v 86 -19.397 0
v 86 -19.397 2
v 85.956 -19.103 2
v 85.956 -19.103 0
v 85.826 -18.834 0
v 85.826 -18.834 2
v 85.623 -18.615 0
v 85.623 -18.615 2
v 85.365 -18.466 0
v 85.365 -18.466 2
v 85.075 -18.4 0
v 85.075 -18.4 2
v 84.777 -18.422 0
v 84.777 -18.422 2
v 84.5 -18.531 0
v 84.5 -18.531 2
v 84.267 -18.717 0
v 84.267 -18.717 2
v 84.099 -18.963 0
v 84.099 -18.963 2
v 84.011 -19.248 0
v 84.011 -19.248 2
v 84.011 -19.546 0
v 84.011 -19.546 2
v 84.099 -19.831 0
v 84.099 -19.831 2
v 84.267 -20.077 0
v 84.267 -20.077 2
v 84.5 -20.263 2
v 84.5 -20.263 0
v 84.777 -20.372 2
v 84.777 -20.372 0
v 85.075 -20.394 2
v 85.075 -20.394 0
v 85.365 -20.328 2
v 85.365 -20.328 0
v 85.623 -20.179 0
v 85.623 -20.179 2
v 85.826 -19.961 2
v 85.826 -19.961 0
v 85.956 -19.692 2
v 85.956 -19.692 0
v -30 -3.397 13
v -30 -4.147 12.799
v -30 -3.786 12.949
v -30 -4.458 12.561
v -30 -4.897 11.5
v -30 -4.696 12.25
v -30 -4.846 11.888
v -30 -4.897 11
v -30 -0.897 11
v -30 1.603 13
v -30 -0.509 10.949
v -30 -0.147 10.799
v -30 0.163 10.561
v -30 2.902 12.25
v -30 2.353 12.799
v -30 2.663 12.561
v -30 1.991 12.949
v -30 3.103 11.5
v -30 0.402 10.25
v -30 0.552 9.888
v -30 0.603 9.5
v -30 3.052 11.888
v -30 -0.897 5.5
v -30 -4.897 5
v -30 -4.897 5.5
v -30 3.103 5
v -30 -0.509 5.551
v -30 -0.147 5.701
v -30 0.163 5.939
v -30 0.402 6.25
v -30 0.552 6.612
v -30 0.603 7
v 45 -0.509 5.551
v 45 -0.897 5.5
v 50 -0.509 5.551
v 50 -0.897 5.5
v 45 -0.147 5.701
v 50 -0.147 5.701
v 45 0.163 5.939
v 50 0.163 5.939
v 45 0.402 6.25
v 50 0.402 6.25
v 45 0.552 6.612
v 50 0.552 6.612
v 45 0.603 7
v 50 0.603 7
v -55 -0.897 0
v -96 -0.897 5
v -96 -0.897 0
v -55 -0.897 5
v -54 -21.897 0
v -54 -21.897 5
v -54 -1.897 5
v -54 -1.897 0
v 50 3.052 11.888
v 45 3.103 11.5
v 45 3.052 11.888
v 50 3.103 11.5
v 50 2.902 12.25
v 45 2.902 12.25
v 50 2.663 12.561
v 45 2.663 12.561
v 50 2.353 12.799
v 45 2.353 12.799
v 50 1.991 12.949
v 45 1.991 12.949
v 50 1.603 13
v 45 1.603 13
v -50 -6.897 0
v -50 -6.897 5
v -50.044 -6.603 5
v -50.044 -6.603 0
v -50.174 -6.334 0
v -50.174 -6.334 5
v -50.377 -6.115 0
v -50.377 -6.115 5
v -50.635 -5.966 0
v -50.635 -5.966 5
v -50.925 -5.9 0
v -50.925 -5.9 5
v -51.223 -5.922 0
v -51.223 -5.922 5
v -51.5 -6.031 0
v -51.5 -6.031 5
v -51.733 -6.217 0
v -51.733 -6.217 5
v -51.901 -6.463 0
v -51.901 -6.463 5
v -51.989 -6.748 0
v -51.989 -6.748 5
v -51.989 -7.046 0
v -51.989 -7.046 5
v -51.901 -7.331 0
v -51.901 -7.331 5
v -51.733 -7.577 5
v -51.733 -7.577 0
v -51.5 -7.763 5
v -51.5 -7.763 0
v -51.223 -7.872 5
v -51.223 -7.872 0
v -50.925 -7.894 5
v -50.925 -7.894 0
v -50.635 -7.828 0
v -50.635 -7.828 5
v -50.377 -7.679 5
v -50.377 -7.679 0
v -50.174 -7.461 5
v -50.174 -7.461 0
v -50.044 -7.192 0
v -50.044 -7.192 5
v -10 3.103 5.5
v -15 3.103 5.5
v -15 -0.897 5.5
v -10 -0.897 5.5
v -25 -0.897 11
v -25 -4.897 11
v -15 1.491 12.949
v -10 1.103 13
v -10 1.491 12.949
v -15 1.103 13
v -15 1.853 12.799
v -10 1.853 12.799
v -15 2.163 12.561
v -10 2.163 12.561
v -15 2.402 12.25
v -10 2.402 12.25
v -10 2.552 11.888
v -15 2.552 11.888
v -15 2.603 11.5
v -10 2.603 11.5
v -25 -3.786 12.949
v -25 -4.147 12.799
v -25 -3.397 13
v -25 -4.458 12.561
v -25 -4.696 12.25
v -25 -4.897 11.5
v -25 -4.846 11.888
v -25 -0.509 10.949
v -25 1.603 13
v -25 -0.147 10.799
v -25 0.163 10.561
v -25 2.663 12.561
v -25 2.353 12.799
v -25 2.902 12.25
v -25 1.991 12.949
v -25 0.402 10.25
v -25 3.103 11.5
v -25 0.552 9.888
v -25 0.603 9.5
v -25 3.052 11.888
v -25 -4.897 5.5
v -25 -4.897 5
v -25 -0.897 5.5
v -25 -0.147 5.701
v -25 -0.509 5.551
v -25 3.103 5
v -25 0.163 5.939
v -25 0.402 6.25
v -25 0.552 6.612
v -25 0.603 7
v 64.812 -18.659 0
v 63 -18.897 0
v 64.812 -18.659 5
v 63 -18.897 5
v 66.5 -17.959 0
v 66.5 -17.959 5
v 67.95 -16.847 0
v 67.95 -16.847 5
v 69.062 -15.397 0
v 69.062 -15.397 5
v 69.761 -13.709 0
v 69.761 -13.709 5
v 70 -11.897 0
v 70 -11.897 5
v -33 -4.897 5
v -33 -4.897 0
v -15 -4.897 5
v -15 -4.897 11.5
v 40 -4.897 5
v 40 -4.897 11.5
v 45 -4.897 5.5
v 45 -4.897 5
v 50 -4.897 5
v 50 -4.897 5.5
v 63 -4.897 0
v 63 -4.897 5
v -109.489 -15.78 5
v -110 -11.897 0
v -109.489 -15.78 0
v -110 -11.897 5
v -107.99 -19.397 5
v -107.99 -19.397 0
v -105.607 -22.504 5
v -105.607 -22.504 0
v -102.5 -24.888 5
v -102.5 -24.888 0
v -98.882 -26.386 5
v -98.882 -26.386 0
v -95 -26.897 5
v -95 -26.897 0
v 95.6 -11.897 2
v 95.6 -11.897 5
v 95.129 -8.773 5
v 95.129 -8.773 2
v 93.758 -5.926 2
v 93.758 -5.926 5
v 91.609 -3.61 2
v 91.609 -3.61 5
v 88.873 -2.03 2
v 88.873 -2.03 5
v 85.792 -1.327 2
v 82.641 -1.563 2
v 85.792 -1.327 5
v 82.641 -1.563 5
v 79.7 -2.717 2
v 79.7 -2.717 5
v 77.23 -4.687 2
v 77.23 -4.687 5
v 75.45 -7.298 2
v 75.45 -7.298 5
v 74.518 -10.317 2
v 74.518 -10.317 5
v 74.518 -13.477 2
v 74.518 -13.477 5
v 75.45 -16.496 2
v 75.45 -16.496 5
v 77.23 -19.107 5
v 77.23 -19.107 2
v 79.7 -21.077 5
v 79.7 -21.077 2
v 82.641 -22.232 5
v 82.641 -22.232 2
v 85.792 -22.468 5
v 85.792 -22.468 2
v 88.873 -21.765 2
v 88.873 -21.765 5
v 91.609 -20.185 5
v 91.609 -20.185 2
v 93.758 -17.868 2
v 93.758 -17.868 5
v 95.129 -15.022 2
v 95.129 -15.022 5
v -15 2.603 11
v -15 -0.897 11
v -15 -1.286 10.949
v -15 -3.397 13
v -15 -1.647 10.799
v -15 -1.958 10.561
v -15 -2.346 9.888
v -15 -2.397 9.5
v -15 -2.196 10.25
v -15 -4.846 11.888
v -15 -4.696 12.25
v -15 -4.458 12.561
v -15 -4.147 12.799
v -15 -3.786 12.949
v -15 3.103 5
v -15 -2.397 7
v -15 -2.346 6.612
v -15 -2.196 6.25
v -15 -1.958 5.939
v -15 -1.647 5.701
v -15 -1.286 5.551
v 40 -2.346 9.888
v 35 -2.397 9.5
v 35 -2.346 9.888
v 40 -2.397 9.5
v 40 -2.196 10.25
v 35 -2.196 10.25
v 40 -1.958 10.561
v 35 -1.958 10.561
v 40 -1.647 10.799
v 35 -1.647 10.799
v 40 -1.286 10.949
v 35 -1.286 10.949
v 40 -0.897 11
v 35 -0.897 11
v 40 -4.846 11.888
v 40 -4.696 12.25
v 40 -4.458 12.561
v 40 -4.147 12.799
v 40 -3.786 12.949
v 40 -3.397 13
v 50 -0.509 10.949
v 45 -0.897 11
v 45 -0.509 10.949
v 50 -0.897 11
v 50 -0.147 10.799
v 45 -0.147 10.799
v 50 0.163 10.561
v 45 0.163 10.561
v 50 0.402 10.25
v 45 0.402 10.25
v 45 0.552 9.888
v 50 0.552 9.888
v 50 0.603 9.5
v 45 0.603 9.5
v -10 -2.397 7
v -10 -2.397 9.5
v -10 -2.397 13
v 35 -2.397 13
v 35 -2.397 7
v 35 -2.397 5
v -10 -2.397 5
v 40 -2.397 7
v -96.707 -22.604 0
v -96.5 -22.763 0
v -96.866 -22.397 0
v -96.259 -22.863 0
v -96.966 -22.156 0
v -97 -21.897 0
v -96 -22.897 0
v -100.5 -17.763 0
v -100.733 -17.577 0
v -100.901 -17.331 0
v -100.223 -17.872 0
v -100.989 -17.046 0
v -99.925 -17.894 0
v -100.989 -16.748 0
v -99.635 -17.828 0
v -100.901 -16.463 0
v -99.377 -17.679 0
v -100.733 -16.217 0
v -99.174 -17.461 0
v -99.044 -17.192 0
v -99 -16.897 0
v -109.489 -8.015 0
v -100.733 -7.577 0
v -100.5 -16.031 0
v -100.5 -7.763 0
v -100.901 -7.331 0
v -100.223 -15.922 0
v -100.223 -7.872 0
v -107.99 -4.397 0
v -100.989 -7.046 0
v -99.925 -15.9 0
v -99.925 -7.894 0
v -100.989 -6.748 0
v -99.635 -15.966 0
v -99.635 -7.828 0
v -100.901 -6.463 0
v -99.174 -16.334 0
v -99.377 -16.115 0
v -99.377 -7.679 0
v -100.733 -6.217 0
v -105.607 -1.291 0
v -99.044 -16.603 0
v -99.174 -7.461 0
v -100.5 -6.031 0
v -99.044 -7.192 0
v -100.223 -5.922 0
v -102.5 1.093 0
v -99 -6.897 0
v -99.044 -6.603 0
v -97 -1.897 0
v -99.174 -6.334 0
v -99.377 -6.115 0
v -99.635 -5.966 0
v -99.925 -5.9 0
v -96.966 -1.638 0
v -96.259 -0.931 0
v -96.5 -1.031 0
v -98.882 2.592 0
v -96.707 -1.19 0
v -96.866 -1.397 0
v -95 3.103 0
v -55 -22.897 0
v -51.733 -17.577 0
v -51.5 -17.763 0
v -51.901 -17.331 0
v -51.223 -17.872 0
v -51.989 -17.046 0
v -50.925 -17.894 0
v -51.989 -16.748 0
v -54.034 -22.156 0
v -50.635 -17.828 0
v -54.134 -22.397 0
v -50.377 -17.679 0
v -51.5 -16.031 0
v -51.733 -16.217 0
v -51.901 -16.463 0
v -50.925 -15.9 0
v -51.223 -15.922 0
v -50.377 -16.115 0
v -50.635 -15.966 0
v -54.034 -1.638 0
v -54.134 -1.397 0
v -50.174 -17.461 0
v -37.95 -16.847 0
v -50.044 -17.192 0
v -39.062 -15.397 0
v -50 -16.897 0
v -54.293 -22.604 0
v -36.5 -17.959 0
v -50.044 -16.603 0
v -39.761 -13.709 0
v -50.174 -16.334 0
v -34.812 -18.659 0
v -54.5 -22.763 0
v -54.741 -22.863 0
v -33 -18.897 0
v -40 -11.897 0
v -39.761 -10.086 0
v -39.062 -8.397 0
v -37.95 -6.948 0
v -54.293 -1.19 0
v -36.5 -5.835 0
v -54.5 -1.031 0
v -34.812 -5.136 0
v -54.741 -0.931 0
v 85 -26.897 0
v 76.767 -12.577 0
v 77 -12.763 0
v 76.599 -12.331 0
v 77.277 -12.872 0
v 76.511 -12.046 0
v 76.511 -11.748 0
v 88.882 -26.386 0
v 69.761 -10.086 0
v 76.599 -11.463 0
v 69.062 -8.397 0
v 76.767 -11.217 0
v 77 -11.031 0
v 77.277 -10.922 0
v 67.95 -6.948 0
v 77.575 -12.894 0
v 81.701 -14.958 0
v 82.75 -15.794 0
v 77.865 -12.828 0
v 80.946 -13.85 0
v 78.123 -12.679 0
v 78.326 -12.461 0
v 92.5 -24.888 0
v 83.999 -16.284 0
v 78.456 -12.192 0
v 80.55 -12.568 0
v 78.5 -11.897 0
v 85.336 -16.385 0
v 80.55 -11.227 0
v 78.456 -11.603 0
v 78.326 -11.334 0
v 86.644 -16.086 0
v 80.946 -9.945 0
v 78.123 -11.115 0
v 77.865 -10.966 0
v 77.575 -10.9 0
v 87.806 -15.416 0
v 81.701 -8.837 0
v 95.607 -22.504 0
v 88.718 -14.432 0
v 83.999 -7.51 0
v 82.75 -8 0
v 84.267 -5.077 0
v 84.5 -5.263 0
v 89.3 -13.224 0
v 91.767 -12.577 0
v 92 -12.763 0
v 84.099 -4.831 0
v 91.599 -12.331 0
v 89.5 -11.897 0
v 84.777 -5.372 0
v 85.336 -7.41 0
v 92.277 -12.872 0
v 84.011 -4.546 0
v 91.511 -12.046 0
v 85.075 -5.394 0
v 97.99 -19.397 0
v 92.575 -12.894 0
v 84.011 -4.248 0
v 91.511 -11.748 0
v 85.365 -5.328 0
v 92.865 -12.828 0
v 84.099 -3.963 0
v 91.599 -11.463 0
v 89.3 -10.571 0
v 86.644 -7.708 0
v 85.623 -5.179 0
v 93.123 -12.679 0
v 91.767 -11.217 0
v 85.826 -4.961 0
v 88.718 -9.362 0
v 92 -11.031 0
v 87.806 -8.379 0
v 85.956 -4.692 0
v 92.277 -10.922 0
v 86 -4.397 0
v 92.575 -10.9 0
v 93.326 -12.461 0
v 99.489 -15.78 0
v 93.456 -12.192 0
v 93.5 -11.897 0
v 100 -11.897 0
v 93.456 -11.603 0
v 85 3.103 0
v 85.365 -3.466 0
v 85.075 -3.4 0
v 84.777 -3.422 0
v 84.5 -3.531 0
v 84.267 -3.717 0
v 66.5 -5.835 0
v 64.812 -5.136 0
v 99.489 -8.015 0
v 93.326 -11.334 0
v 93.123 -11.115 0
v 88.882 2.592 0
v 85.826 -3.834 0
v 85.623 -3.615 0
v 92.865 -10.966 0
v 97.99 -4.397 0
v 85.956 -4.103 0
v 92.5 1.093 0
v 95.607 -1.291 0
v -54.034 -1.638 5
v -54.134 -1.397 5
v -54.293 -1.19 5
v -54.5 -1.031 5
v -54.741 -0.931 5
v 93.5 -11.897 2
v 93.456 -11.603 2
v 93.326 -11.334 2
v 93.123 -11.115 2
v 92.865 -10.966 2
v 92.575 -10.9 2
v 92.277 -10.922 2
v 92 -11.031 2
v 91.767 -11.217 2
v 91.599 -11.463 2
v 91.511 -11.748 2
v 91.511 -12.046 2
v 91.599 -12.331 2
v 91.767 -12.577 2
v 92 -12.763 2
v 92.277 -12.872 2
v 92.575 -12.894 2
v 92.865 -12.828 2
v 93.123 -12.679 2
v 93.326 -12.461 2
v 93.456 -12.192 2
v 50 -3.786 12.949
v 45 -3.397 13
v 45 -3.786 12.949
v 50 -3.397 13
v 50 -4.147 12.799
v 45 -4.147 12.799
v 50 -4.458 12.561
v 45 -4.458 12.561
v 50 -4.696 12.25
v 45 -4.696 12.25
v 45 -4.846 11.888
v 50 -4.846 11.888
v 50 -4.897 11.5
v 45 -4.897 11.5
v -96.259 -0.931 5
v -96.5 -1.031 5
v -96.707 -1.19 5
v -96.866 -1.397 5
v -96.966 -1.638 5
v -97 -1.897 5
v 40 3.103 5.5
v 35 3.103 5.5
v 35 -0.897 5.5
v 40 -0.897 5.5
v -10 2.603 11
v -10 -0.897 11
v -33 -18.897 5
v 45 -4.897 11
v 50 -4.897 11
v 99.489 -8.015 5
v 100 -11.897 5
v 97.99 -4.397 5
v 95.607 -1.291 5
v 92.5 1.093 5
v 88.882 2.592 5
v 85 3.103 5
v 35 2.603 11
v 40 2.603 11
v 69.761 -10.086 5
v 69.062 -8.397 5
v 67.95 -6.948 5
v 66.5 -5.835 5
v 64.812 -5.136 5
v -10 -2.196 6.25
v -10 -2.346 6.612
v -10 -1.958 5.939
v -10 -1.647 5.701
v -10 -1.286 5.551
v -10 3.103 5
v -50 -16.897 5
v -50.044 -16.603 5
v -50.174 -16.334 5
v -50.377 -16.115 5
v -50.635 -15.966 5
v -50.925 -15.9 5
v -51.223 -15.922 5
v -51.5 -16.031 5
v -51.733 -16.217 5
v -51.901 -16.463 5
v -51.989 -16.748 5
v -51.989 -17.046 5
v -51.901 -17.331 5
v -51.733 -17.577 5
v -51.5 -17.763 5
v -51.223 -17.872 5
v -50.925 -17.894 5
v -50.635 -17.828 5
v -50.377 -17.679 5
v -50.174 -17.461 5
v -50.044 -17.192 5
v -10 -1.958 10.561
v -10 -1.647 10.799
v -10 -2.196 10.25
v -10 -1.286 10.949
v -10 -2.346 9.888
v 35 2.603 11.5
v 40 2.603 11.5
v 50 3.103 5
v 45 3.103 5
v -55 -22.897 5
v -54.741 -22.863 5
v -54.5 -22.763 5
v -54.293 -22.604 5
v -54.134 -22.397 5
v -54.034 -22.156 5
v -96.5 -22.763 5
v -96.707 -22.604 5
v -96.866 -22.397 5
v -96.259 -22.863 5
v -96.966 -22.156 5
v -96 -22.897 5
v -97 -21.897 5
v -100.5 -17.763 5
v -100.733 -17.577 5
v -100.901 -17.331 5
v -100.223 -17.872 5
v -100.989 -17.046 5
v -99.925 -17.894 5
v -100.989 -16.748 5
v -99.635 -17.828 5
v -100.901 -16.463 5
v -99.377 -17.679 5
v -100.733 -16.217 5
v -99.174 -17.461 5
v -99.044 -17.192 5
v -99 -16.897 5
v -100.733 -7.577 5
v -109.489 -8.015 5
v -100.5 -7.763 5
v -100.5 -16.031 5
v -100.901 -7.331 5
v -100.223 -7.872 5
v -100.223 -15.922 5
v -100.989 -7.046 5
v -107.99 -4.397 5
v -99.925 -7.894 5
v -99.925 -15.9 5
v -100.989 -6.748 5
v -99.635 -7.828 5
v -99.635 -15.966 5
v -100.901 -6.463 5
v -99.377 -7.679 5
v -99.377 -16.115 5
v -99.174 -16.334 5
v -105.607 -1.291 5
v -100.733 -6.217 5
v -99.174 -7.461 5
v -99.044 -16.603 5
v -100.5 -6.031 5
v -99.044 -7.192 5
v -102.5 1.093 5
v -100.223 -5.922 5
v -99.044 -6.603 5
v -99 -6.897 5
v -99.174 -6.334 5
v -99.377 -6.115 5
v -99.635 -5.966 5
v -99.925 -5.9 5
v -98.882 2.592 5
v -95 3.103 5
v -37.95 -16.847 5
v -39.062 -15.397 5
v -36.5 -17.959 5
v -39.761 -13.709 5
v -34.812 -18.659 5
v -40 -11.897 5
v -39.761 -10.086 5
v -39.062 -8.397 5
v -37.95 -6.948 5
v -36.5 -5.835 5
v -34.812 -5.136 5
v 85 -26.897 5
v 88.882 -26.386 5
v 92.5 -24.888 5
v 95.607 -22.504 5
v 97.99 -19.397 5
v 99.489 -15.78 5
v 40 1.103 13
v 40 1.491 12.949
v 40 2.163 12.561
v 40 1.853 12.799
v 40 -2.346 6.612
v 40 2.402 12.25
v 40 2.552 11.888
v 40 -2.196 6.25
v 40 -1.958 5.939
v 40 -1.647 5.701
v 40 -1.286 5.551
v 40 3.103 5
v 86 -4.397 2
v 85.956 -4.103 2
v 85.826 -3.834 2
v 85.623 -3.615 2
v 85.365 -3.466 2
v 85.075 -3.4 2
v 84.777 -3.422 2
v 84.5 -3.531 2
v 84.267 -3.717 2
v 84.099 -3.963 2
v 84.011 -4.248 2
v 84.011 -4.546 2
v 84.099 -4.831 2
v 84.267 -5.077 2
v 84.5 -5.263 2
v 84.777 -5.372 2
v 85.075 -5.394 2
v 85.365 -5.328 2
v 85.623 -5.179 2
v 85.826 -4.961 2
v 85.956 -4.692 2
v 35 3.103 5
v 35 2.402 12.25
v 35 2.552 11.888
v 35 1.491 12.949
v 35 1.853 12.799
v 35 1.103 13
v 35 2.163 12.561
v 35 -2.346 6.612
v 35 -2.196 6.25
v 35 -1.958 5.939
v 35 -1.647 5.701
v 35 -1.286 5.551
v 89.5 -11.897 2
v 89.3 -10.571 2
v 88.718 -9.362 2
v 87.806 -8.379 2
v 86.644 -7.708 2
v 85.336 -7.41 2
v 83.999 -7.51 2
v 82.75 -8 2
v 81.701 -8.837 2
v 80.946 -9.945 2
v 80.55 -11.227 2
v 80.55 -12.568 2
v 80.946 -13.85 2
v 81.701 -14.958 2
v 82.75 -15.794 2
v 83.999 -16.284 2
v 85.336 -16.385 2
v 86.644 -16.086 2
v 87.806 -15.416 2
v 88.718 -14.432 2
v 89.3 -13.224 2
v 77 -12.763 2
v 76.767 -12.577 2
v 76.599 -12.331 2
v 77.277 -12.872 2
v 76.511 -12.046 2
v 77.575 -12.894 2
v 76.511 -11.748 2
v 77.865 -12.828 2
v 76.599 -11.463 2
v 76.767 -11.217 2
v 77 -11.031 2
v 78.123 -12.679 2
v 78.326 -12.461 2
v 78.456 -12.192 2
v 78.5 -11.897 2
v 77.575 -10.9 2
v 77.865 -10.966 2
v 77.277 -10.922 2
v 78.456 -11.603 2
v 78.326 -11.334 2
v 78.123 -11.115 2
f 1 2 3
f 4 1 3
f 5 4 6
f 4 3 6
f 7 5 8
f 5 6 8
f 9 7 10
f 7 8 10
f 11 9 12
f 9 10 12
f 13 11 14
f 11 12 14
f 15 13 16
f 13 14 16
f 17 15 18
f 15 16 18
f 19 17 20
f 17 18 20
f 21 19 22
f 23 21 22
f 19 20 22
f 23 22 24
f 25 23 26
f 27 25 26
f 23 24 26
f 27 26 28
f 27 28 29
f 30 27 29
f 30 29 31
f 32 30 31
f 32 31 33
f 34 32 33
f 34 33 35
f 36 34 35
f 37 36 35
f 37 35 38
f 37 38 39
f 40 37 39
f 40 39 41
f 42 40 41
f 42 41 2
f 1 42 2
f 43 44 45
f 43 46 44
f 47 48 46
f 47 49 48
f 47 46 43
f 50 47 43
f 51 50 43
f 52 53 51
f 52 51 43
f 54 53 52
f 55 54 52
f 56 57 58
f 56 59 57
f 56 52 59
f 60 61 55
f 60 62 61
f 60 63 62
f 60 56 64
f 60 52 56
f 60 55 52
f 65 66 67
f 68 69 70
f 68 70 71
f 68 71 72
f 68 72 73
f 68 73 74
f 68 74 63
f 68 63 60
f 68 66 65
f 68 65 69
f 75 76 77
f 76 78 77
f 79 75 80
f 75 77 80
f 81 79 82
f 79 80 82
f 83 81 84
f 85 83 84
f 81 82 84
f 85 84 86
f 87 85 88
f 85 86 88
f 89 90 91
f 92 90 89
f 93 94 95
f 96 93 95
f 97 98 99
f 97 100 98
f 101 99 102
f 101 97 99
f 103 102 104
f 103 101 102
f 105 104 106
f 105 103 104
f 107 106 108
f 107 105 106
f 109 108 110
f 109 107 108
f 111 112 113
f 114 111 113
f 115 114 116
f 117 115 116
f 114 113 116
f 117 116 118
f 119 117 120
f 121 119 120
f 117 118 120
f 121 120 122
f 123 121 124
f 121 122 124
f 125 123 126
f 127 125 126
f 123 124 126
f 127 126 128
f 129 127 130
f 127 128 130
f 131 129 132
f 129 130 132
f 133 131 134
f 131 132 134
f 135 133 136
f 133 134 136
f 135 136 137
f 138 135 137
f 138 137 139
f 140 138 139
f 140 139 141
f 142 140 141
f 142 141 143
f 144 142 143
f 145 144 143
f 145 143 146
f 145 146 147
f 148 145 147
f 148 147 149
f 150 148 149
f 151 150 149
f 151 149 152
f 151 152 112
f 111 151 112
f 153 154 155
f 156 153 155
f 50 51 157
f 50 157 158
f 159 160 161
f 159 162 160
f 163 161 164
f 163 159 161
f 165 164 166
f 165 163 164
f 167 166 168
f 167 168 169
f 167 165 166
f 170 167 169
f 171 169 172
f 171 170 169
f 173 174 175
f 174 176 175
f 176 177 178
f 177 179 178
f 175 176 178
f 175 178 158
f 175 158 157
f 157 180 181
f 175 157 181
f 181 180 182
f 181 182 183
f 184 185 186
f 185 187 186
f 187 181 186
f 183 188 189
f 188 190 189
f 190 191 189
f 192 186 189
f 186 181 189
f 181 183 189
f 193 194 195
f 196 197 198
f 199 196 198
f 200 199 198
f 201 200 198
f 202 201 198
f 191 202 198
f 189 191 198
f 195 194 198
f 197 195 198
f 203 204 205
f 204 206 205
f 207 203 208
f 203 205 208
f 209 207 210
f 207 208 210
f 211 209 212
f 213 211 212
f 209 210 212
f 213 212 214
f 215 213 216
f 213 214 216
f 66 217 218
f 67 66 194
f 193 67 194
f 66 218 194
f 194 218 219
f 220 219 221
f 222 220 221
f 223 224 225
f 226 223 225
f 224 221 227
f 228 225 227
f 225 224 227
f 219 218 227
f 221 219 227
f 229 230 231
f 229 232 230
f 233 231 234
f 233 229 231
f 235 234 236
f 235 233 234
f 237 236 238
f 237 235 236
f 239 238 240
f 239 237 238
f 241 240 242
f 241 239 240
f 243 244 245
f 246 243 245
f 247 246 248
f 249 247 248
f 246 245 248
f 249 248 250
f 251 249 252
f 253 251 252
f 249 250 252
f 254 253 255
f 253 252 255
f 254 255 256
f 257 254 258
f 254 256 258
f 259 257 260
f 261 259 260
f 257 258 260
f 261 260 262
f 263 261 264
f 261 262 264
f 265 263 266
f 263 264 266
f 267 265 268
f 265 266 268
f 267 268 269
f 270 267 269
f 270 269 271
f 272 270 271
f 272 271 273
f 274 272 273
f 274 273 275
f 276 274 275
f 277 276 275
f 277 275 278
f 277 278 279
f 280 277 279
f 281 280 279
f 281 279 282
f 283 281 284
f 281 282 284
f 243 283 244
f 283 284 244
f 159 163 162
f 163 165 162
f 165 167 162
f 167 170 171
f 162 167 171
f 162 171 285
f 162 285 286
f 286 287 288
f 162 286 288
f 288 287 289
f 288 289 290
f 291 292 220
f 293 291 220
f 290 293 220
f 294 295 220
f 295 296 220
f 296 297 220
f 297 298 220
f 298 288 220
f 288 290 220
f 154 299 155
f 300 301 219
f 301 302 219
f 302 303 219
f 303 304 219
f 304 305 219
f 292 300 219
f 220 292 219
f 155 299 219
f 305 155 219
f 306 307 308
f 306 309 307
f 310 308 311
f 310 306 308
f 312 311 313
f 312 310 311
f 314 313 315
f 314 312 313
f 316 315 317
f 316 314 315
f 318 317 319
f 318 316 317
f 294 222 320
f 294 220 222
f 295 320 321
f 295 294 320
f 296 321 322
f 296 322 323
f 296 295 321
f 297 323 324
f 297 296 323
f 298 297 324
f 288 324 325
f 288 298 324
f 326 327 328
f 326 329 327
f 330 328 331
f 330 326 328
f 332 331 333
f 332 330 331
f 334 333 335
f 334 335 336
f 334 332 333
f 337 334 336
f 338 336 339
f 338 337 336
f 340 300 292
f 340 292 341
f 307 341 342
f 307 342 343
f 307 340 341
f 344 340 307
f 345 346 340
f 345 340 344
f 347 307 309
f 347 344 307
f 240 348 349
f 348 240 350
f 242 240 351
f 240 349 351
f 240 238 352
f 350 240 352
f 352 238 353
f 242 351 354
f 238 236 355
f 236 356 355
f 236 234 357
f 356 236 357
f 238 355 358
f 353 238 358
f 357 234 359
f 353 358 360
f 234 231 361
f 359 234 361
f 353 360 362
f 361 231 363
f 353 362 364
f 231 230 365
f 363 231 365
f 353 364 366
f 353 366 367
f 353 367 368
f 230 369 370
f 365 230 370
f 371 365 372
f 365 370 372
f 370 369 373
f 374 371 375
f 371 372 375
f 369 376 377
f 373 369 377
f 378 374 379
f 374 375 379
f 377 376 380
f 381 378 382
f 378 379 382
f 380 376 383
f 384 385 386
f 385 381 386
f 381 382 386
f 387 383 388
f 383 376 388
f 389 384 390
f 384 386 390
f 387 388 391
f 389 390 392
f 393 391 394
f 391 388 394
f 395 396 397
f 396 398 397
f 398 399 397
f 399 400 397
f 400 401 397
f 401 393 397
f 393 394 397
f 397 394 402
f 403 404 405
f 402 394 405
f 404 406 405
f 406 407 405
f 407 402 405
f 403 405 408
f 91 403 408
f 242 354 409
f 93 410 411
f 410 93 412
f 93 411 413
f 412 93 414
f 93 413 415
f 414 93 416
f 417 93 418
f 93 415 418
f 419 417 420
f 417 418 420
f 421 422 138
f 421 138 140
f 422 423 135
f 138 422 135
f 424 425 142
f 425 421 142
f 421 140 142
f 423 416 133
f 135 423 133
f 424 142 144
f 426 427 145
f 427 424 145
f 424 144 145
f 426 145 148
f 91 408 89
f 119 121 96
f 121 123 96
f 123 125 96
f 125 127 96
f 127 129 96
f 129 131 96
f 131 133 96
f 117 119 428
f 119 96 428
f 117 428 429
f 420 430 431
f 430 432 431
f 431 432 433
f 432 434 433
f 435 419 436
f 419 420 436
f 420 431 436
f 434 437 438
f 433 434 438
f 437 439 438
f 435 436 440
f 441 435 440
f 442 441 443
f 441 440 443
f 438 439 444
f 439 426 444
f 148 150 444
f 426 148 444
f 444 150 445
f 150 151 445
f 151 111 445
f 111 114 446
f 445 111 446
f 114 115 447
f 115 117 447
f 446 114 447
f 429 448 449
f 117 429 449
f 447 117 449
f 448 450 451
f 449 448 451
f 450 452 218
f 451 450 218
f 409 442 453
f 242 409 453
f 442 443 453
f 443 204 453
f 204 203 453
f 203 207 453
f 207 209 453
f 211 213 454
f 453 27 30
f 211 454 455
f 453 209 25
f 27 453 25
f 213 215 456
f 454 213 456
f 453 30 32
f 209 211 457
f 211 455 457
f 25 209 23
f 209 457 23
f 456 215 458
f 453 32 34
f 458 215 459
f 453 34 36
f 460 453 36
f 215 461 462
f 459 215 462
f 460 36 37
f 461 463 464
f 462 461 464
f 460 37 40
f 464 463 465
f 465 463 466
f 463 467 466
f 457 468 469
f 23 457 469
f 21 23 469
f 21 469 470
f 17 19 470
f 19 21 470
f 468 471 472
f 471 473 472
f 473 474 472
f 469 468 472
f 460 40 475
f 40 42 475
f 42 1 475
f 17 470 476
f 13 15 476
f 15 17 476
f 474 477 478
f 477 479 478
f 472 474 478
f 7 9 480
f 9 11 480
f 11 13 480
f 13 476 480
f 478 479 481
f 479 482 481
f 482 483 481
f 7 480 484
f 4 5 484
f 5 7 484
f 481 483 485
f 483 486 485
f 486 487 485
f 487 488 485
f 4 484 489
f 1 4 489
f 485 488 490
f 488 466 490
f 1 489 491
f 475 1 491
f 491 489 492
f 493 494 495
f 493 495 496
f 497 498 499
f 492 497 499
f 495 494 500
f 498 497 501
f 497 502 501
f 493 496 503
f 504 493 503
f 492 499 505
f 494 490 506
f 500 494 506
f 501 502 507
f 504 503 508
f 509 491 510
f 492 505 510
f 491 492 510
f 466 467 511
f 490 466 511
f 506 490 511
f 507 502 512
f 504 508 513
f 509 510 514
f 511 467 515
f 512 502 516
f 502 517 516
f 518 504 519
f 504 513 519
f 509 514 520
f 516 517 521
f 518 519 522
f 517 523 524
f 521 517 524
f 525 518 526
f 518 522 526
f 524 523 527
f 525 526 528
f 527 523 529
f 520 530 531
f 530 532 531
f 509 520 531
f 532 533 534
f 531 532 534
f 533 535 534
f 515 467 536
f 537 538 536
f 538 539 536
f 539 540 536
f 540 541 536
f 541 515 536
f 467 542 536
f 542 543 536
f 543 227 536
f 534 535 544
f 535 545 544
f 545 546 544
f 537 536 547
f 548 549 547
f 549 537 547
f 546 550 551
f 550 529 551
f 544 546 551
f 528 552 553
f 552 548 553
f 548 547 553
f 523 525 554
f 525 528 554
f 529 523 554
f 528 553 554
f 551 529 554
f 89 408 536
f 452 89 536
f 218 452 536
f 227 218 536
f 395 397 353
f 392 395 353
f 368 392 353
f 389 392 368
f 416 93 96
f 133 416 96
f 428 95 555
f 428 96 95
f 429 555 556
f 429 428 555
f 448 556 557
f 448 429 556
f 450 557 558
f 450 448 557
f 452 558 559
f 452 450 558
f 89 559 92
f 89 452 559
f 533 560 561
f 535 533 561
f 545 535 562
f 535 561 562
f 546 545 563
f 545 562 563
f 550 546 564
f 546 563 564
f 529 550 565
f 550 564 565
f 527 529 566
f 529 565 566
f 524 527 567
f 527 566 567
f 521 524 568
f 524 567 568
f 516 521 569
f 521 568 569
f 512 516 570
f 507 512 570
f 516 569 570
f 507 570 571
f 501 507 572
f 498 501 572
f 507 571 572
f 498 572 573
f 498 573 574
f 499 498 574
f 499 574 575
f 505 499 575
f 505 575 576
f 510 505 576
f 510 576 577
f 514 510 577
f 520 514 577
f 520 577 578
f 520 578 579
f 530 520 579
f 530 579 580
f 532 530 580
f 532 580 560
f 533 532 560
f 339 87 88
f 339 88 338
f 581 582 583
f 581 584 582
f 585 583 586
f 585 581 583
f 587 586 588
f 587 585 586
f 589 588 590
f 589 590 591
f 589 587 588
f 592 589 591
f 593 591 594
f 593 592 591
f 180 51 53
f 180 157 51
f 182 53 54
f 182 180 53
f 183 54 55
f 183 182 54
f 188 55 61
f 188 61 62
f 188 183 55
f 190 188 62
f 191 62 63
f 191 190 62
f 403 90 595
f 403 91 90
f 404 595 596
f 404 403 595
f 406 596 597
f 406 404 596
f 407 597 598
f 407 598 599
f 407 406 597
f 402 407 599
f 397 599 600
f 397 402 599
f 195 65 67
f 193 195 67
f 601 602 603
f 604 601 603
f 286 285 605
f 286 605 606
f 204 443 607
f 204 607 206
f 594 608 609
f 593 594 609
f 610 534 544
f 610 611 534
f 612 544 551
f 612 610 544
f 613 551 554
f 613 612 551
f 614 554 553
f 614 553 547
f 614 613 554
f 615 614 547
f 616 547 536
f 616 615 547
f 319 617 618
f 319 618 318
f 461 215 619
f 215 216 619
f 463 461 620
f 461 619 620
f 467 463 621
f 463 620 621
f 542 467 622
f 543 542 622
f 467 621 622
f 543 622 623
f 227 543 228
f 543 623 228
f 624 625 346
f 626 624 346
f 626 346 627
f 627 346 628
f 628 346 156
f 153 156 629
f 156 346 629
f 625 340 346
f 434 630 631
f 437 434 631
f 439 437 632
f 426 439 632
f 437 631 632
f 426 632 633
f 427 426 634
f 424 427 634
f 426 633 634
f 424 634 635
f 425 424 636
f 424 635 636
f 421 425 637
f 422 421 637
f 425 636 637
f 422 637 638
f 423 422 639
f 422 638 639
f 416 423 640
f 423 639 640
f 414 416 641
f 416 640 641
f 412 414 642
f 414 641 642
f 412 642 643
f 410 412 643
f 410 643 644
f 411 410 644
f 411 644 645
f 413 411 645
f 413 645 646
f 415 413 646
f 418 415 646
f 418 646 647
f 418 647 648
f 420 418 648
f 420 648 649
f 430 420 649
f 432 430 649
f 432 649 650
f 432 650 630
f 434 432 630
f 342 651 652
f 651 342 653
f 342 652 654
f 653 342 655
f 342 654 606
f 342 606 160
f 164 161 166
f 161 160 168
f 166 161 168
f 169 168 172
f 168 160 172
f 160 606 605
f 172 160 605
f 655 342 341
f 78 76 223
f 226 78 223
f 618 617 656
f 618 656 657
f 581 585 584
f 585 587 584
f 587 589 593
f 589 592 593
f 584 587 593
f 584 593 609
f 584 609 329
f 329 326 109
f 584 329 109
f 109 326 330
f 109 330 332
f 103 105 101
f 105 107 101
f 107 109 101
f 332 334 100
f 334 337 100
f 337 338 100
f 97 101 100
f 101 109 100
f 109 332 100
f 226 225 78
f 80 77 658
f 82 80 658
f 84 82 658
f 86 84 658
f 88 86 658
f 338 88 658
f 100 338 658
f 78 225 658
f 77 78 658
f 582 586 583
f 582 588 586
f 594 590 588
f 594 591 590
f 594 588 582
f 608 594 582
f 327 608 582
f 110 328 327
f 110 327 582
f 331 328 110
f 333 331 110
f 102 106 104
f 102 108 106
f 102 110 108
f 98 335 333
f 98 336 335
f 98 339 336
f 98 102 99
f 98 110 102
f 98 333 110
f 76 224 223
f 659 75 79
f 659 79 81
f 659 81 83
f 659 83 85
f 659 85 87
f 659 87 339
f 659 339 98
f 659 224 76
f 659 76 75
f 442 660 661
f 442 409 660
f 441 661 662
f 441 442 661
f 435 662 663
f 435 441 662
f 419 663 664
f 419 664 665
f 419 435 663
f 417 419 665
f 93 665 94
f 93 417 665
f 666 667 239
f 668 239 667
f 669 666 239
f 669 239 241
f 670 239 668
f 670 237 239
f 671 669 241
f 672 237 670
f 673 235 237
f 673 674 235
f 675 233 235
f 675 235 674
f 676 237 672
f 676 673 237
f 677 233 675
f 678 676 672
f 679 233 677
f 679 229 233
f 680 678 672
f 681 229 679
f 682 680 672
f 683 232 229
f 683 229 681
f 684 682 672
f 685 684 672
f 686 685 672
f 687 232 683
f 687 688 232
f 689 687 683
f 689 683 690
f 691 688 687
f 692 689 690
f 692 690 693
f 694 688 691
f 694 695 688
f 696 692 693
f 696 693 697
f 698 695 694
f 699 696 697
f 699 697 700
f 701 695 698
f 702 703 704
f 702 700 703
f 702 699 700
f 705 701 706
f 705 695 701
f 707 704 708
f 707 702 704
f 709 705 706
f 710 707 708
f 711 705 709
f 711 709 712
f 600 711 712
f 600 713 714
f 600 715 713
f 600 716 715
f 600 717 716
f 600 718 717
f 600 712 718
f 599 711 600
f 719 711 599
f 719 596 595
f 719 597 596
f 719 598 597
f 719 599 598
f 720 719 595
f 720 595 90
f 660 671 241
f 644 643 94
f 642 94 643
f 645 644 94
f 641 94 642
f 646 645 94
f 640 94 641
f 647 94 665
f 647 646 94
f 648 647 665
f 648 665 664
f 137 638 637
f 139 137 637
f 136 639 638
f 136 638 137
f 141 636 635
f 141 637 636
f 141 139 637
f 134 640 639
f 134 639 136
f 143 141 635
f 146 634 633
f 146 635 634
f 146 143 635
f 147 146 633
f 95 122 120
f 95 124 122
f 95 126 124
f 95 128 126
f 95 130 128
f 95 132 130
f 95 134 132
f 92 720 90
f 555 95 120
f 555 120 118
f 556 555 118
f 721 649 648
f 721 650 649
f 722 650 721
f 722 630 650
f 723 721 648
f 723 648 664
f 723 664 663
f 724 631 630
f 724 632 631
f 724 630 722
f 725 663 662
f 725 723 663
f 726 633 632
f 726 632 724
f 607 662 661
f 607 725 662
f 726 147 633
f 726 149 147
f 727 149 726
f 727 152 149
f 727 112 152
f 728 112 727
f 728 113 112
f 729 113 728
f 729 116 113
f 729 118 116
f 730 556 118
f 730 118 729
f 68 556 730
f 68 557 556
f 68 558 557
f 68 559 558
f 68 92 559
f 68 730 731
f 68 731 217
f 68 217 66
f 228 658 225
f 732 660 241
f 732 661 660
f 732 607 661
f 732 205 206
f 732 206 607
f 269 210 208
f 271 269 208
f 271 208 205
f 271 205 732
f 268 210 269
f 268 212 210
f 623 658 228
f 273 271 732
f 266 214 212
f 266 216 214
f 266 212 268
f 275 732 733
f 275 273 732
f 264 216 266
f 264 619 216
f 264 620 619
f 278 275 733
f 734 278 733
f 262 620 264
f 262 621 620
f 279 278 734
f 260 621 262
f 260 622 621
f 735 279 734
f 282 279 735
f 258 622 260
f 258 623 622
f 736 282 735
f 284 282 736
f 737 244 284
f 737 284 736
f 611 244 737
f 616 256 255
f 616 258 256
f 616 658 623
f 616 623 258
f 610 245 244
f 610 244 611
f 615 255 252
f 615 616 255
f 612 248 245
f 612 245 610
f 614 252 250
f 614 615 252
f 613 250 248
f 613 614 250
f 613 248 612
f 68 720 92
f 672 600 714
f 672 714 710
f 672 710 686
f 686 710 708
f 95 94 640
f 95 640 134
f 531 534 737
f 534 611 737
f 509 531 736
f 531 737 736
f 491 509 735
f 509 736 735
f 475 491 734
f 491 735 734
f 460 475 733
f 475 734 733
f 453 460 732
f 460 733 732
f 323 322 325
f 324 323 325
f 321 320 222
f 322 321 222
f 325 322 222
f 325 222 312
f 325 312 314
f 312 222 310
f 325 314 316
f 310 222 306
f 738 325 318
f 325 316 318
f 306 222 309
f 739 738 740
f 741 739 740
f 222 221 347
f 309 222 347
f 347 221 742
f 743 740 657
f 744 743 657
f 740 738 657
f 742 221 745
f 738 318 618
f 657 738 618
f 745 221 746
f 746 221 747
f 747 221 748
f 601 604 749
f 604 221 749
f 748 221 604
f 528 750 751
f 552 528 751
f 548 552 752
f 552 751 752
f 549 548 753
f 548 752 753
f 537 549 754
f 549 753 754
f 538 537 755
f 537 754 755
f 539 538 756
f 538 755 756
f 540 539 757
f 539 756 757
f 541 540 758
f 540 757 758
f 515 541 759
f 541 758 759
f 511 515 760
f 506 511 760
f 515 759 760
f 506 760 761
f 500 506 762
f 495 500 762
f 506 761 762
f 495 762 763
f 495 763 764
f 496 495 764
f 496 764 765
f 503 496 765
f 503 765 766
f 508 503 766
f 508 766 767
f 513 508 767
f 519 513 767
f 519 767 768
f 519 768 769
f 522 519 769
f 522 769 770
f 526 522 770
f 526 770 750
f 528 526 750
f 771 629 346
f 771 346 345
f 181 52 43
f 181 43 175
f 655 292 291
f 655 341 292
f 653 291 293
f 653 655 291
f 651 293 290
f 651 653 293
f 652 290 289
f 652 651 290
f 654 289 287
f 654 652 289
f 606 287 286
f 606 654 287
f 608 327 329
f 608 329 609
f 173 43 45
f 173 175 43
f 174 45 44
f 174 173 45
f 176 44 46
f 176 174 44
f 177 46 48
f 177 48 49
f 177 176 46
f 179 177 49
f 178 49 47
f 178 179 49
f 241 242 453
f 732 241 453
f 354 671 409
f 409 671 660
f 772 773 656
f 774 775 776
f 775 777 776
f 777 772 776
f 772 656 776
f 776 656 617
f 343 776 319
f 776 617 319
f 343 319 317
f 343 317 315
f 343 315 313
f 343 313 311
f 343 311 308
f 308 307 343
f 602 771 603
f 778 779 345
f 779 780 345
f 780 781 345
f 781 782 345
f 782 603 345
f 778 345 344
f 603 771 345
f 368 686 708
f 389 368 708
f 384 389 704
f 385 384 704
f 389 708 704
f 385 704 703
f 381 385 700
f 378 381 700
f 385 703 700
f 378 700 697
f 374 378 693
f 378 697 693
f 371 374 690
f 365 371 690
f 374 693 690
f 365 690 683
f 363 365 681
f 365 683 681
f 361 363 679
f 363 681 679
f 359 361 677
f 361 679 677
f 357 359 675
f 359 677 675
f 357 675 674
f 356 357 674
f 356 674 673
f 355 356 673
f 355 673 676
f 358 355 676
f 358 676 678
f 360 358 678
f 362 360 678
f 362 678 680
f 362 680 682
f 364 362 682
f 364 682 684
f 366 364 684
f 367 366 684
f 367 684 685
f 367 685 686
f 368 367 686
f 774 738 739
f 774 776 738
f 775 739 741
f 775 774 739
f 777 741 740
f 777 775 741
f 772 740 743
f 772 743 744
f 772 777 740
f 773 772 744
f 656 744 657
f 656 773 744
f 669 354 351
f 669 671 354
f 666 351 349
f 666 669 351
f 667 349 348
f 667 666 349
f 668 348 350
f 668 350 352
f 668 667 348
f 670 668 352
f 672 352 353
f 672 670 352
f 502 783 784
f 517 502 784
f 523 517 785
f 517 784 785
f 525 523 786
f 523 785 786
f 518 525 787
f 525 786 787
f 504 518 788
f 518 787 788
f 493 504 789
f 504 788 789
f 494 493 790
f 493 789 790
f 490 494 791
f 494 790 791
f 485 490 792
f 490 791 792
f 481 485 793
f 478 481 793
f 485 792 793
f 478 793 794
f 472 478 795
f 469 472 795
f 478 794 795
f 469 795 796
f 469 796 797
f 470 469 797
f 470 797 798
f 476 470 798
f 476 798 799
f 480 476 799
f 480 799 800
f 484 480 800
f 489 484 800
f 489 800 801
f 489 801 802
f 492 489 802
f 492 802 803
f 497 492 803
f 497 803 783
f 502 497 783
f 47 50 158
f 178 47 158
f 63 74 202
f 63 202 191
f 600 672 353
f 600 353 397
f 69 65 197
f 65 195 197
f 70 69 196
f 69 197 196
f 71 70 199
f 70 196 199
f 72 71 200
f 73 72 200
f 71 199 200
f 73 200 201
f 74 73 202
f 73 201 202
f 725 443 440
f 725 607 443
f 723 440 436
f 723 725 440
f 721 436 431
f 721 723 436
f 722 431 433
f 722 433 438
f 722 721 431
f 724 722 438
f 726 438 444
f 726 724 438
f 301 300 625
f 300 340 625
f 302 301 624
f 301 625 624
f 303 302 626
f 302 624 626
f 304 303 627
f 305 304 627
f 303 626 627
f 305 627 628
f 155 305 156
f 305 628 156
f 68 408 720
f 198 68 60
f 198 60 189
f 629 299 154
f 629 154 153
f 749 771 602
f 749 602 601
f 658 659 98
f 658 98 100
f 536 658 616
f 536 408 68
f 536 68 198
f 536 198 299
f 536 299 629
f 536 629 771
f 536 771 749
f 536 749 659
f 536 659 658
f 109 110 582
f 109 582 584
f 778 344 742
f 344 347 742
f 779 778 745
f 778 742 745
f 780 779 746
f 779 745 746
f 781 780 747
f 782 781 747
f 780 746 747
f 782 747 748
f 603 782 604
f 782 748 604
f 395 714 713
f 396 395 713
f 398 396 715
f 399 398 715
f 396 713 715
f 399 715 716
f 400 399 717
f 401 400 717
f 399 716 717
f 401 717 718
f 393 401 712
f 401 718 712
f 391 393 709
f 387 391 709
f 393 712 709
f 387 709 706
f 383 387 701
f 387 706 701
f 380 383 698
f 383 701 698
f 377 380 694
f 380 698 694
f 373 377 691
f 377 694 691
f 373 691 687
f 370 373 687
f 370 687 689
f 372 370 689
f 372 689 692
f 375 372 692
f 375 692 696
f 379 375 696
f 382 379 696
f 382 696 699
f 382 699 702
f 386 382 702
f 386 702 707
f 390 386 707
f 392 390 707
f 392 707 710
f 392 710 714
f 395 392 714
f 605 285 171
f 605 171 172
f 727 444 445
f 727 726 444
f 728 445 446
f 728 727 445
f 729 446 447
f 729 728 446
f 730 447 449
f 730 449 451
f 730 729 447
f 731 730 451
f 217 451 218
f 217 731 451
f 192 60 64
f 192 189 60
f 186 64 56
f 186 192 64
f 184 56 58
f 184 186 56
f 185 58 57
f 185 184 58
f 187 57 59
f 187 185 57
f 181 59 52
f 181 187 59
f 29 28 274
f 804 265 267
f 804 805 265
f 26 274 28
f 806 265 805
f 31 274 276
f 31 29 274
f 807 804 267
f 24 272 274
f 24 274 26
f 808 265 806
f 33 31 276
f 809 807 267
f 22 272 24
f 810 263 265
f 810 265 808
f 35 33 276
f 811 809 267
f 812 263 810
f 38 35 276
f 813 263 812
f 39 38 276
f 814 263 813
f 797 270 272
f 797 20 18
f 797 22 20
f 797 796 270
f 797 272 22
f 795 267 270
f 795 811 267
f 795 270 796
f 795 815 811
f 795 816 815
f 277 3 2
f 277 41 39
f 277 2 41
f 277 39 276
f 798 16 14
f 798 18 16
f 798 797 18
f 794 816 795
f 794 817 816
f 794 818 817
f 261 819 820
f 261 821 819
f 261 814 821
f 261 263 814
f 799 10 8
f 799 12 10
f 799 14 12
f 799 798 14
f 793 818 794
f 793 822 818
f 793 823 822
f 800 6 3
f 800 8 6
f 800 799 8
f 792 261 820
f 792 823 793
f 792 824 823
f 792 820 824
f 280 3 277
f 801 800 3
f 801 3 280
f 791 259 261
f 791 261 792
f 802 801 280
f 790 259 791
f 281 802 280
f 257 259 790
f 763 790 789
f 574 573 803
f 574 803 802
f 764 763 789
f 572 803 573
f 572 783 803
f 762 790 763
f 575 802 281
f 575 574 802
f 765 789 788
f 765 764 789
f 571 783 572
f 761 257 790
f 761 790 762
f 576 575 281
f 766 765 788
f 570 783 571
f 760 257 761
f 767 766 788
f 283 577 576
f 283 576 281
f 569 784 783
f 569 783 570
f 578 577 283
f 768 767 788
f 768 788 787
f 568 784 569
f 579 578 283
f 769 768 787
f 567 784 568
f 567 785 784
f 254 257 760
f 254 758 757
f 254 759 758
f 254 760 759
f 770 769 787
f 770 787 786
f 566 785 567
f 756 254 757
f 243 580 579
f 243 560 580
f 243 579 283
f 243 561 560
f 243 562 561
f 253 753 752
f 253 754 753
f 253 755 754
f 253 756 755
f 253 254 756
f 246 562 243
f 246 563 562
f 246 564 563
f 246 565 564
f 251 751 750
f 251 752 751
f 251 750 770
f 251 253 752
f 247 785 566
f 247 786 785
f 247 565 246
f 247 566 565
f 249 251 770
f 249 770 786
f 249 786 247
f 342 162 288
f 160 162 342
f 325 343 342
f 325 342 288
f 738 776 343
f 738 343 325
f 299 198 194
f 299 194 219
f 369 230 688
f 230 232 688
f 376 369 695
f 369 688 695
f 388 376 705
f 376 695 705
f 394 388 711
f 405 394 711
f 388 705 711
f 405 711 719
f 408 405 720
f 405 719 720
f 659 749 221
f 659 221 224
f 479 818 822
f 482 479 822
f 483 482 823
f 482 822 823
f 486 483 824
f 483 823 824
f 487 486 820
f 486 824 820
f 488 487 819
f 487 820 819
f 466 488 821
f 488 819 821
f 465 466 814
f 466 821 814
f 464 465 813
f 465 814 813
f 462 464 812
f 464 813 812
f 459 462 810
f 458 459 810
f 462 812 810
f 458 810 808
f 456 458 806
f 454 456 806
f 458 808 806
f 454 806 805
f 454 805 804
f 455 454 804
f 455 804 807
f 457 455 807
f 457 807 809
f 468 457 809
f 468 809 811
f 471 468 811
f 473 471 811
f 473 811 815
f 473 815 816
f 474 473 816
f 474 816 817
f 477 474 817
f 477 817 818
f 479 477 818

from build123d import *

# Parameters (mm, degrees)
F0_W      = 210
F0_H      = 30
F0_W_2    = 110
F0_H_2    = 14
F1_DEPTH  = 5
F2_R      = 10.6
F2_R_2    = 1
F2_R_3    = 4.5
F2_W      = 43
F2_H      = 22
F2_R_4    = 2.75
F3_DEPTH  = 3
F4_DEPTH  = 25
F5_R      = 14.99999
F6_R      = 6.99999
F7_R      = 1
F8_DEPTH  = 25
F9_W      = 5
F9_H      = 8
F10_DEPTH = 8
F11_W     = 5.5
F11_H     = 5.5
F12_DEPTH = 6
F13_W     = 5.5
F13_H     = 5.5
F14_DEPTH = 6
F15_W     = 5.5
F15_H     = 5.5
F16_W     = 5.5
F16_H     = 5.5
F17_DEPTH = 6
F9_W_2    = 45
F9_H_2    = 2.5
F18_DEPTH = 8
F19_DEPTH = 0.5
F20_R     = 1.5


# Not quite as in the source:
# - a fillet or chamfer is up to 0.001 mm smaller than in the source, because OpenCascade refuses the exact size
# - a feature names something its author has since deleted; it is built from what else it names


with BuildPart() as f1:
    # F0 (on Top) → F1 (new body)
    with BuildSketch(Plane.XY):
        with Locations((-5, -11.8972941886)):
            Rectangle(F0_W, F0_H)
        with Locations((15, -11.8972941886)):
            Rectangle(F0_W_2, F0_H_2, mode=Mode.SUBTRACT)
    extrude(amount=F1_DEPTH)

    # F2 (on face) → F3 (cut)
    with BuildSketch(Plane.XY.offset(5)):
        with Locations((85, -11.8972941886)):
            Circle(F2_R)
        with Locations((85, -19.3972941886)):
            Circle(F2_R_2, mode=Mode.SUBTRACT)
        with Locations((85, -11.8972941886)):
            Circle(F2_R_3, mode=Mode.SUBTRACT)
        with Locations((77.5, -11.8972941886)):
            Circle(F2_R_2, mode=Mode.SUBTRACT)
        with Locations((92.5, -11.8972941886)):
            Circle(F2_R_2, mode=Mode.SUBTRACT)
        with Locations((85, -4.3972941886)):
            Circle(F2_R_2, mode=Mode.SUBTRACT)
        with Locations((-75.5, -11.8972941886)):
            Rectangle(F2_W, F2_H)
        with Locations((-65, -11.8972941886)):
            Circle(F2_R_4, mode=Mode.SUBTRACT)
    extrude(amount=-F3_DEPTH, mode=Mode.SUBTRACT)

    # F2 (on face) → F4 (cut)
    with BuildSketch(Plane.XY.offset(5)):
        with Locations((-75.5, -11.8972941886)):
            Rectangle(F2_W, F2_H)
        with Locations((-65, -11.8972941886)):
            Circle(F2_R_4, mode=Mode.SUBTRACT)
        with Locations((85, -11.8972941886)):
            Circle(F2_R_3)
        with Locations((-65, -11.8972941886)):
            Circle(F2_R_4)
        with Locations((85, -4.3972941886)):
            Circle(F2_R_2)
        with Locations((77.5, -11.8972941886)):
            Circle(F2_R_2)
        with Locations((85, -19.3972941886)):
            Circle(F2_R_2)
        with Locations((92.5, -11.8972941886)):
            Circle(F2_R_2)
    extrude(amount=-F4_DEPTH, mode=Mode.SUBTRACT)

    # F5 (radius 15 in the source; OpenCascade refuses exactly that, so slightly less here)
    f5_edges = [f1.edges().sort_by_distance(p)[0] for p in [
        (100, 3.102706, 2.5),
        (100, -26.897294, 2.5),
        (-110, -26.897294, 2.5),
        (-110, 3.102706, 2.5),
    ]]
    fillet(f5_edges, radius=F5_R)

    # F6 (radius 7 in the source; OpenCascade refuses exactly that, so slightly less here)
    f6_edges = [f1.edges().sort_by_distance(p)[0] for p in [
        (-40, -4.897294, 2.5),
        (-40, -18.897294, 2.5),
        (70, -4.897294, 2.5),
        (70, -18.897294, 2.5),
    ]]
    fillet(f6_edges, radius=F6_R)

    # F7
    f7_edges = [f1.edges().sort_by_distance(p)[0] for p in [
        (-97, -0.897294, 2.5),
        (-97, -22.897294, 2.5),
        (-54, -0.897294, 2.5),
        (-54, -22.897294, 2.5),
    ]]
    fillet(f7_edges, radius=F7_R)

    # F2 (on face) → F8 (cut)
    with BuildSketch(Plane.XY.offset(5)):
        with Locations((-100, -6.8972941886)):
            Circle(F2_R_2)
        with Locations((-100, -16.8972941886)):
            Circle(F2_R_2)
        with Locations((-51, -6.8972941886)):
            Circle(F2_R_2)
        with Locations((-51, -16.8972941886)):
            Circle(F2_R_2)
    extrude(amount=-F8_DEPTH, mode=Mode.SUBTRACT)

    # F9 (on face) → F10 (join)
    with BuildSketch(Plane.XY.offset(5)):
        with Locations((-27.5, -0.8972941886)):
            Rectangle(F9_W, F9_H)
        Polygon((-10, 3.1027058114), (-15, 3.1027058114), (-15, -4.8972941886), (-10, -4.8972941886), (-10, -2.3972941886), align=None)
        Polygon((40, 3.1027058114), (35, 3.1027058114), (35, -2.3972941886), (35, -4.8972941886), (40, -4.8972941886), align=None)
        with Locations((47.5, -0.8972941886)):
            Rectangle(F9_W, F9_H)
    extrude(amount=F10_DEPTH)

    # F11 (on face) → F12 (cut)
    with BuildSketch(Plane(origin=(-30, 0, 0), x_dir=(0, -1, 0), z_dir=(-1, 0, 0))):
        with Locations((2.1472941886, 8.25)):
            Rectangle(F11_W, F11_H)
    extrude(amount=-F12_DEPTH, mode=Mode.SUBTRACT)

    # F13 (on face) → F14 (cut)
    with BuildSketch(Plane(origin=(-15, 0, 0), x_dir=(0, -1, 0), z_dir=(-1, 0, 0))):
        with Locations((-0.3527058114, 8.25)):
            Rectangle(F13_W, F13_H)
    extrude(amount=-F14_DEPTH, mode=Mode.SUBTRACT)

    # F15 (on face) + F16 (on face) → F17 (cut)
    with BuildSketch(Plane(origin=(35, 0, 0), x_dir=(0, -1, 0), z_dir=(-1, 0, 0))):
        with Locations((-0.3527058114, 8.25)):
            Rectangle(F15_W, F15_H)
    with BuildSketch(Plane(origin=(45, 0, 0), x_dir=(0, -1, 0), z_dir=(-1, 0, 0))):
        with Locations((2.1472941886, 8.25)):
            Rectangle(F16_W, F16_H)
    extrude(amount=-F17_DEPTH, mode=Mode.SUBTRACT)

    # F9 (on face) → F18 (join)
    with BuildSketch(Plane.XY.offset(5)):
        with Locations((12.5, -3.6472941886)):
            Rectangle(F9_W_2, F9_H_2)
    extrude(amount=F18_DEPTH)

    # F19 (cut): faces of the model
    f19_faces = [f1.faces().sort_by_distance(p)[0] for p in [
        (37.5, 3.1027058114, 12),
        (-12.5, 3.1027058114, 12),
        (47.5, -4.8972941886, 12),
        (-27.5, -4.8972941886, 12),
    ]]
    extrude(f19_faces, amount=-F19_DEPTH, dir=(0, 1, 0), mode=Mode.SUBTRACT)

    # F20
    f20_edges = [f1.edges().sort_by_distance(p)[0] for p in [
        (-27.5, 3.102706, 13),
        (-27.5, -4.897294, 13),
        (12.5, -4.897294, 13),
        (-12.5, 2.602706, 13),
        (-12.5, -2.397294, 5.5),
        (-12.5, -2.397294, 11),
        (-27.5, 0.602706, 5.5),
        (-27.5, 0.602706, 11),
        (37.5, 2.602706, 13),
        (47.5, 3.102706, 13),
        (47.5, -4.897294, 13),
        (37.5, -2.397294, 11),
        (37.5, -2.397294, 5.5),
        (47.5, 0.602706, 5.5),
        (47.5, 0.602706, 11),
    ]]
    fillet(f20_edges, radius=F20_R)


solid = f1.part
